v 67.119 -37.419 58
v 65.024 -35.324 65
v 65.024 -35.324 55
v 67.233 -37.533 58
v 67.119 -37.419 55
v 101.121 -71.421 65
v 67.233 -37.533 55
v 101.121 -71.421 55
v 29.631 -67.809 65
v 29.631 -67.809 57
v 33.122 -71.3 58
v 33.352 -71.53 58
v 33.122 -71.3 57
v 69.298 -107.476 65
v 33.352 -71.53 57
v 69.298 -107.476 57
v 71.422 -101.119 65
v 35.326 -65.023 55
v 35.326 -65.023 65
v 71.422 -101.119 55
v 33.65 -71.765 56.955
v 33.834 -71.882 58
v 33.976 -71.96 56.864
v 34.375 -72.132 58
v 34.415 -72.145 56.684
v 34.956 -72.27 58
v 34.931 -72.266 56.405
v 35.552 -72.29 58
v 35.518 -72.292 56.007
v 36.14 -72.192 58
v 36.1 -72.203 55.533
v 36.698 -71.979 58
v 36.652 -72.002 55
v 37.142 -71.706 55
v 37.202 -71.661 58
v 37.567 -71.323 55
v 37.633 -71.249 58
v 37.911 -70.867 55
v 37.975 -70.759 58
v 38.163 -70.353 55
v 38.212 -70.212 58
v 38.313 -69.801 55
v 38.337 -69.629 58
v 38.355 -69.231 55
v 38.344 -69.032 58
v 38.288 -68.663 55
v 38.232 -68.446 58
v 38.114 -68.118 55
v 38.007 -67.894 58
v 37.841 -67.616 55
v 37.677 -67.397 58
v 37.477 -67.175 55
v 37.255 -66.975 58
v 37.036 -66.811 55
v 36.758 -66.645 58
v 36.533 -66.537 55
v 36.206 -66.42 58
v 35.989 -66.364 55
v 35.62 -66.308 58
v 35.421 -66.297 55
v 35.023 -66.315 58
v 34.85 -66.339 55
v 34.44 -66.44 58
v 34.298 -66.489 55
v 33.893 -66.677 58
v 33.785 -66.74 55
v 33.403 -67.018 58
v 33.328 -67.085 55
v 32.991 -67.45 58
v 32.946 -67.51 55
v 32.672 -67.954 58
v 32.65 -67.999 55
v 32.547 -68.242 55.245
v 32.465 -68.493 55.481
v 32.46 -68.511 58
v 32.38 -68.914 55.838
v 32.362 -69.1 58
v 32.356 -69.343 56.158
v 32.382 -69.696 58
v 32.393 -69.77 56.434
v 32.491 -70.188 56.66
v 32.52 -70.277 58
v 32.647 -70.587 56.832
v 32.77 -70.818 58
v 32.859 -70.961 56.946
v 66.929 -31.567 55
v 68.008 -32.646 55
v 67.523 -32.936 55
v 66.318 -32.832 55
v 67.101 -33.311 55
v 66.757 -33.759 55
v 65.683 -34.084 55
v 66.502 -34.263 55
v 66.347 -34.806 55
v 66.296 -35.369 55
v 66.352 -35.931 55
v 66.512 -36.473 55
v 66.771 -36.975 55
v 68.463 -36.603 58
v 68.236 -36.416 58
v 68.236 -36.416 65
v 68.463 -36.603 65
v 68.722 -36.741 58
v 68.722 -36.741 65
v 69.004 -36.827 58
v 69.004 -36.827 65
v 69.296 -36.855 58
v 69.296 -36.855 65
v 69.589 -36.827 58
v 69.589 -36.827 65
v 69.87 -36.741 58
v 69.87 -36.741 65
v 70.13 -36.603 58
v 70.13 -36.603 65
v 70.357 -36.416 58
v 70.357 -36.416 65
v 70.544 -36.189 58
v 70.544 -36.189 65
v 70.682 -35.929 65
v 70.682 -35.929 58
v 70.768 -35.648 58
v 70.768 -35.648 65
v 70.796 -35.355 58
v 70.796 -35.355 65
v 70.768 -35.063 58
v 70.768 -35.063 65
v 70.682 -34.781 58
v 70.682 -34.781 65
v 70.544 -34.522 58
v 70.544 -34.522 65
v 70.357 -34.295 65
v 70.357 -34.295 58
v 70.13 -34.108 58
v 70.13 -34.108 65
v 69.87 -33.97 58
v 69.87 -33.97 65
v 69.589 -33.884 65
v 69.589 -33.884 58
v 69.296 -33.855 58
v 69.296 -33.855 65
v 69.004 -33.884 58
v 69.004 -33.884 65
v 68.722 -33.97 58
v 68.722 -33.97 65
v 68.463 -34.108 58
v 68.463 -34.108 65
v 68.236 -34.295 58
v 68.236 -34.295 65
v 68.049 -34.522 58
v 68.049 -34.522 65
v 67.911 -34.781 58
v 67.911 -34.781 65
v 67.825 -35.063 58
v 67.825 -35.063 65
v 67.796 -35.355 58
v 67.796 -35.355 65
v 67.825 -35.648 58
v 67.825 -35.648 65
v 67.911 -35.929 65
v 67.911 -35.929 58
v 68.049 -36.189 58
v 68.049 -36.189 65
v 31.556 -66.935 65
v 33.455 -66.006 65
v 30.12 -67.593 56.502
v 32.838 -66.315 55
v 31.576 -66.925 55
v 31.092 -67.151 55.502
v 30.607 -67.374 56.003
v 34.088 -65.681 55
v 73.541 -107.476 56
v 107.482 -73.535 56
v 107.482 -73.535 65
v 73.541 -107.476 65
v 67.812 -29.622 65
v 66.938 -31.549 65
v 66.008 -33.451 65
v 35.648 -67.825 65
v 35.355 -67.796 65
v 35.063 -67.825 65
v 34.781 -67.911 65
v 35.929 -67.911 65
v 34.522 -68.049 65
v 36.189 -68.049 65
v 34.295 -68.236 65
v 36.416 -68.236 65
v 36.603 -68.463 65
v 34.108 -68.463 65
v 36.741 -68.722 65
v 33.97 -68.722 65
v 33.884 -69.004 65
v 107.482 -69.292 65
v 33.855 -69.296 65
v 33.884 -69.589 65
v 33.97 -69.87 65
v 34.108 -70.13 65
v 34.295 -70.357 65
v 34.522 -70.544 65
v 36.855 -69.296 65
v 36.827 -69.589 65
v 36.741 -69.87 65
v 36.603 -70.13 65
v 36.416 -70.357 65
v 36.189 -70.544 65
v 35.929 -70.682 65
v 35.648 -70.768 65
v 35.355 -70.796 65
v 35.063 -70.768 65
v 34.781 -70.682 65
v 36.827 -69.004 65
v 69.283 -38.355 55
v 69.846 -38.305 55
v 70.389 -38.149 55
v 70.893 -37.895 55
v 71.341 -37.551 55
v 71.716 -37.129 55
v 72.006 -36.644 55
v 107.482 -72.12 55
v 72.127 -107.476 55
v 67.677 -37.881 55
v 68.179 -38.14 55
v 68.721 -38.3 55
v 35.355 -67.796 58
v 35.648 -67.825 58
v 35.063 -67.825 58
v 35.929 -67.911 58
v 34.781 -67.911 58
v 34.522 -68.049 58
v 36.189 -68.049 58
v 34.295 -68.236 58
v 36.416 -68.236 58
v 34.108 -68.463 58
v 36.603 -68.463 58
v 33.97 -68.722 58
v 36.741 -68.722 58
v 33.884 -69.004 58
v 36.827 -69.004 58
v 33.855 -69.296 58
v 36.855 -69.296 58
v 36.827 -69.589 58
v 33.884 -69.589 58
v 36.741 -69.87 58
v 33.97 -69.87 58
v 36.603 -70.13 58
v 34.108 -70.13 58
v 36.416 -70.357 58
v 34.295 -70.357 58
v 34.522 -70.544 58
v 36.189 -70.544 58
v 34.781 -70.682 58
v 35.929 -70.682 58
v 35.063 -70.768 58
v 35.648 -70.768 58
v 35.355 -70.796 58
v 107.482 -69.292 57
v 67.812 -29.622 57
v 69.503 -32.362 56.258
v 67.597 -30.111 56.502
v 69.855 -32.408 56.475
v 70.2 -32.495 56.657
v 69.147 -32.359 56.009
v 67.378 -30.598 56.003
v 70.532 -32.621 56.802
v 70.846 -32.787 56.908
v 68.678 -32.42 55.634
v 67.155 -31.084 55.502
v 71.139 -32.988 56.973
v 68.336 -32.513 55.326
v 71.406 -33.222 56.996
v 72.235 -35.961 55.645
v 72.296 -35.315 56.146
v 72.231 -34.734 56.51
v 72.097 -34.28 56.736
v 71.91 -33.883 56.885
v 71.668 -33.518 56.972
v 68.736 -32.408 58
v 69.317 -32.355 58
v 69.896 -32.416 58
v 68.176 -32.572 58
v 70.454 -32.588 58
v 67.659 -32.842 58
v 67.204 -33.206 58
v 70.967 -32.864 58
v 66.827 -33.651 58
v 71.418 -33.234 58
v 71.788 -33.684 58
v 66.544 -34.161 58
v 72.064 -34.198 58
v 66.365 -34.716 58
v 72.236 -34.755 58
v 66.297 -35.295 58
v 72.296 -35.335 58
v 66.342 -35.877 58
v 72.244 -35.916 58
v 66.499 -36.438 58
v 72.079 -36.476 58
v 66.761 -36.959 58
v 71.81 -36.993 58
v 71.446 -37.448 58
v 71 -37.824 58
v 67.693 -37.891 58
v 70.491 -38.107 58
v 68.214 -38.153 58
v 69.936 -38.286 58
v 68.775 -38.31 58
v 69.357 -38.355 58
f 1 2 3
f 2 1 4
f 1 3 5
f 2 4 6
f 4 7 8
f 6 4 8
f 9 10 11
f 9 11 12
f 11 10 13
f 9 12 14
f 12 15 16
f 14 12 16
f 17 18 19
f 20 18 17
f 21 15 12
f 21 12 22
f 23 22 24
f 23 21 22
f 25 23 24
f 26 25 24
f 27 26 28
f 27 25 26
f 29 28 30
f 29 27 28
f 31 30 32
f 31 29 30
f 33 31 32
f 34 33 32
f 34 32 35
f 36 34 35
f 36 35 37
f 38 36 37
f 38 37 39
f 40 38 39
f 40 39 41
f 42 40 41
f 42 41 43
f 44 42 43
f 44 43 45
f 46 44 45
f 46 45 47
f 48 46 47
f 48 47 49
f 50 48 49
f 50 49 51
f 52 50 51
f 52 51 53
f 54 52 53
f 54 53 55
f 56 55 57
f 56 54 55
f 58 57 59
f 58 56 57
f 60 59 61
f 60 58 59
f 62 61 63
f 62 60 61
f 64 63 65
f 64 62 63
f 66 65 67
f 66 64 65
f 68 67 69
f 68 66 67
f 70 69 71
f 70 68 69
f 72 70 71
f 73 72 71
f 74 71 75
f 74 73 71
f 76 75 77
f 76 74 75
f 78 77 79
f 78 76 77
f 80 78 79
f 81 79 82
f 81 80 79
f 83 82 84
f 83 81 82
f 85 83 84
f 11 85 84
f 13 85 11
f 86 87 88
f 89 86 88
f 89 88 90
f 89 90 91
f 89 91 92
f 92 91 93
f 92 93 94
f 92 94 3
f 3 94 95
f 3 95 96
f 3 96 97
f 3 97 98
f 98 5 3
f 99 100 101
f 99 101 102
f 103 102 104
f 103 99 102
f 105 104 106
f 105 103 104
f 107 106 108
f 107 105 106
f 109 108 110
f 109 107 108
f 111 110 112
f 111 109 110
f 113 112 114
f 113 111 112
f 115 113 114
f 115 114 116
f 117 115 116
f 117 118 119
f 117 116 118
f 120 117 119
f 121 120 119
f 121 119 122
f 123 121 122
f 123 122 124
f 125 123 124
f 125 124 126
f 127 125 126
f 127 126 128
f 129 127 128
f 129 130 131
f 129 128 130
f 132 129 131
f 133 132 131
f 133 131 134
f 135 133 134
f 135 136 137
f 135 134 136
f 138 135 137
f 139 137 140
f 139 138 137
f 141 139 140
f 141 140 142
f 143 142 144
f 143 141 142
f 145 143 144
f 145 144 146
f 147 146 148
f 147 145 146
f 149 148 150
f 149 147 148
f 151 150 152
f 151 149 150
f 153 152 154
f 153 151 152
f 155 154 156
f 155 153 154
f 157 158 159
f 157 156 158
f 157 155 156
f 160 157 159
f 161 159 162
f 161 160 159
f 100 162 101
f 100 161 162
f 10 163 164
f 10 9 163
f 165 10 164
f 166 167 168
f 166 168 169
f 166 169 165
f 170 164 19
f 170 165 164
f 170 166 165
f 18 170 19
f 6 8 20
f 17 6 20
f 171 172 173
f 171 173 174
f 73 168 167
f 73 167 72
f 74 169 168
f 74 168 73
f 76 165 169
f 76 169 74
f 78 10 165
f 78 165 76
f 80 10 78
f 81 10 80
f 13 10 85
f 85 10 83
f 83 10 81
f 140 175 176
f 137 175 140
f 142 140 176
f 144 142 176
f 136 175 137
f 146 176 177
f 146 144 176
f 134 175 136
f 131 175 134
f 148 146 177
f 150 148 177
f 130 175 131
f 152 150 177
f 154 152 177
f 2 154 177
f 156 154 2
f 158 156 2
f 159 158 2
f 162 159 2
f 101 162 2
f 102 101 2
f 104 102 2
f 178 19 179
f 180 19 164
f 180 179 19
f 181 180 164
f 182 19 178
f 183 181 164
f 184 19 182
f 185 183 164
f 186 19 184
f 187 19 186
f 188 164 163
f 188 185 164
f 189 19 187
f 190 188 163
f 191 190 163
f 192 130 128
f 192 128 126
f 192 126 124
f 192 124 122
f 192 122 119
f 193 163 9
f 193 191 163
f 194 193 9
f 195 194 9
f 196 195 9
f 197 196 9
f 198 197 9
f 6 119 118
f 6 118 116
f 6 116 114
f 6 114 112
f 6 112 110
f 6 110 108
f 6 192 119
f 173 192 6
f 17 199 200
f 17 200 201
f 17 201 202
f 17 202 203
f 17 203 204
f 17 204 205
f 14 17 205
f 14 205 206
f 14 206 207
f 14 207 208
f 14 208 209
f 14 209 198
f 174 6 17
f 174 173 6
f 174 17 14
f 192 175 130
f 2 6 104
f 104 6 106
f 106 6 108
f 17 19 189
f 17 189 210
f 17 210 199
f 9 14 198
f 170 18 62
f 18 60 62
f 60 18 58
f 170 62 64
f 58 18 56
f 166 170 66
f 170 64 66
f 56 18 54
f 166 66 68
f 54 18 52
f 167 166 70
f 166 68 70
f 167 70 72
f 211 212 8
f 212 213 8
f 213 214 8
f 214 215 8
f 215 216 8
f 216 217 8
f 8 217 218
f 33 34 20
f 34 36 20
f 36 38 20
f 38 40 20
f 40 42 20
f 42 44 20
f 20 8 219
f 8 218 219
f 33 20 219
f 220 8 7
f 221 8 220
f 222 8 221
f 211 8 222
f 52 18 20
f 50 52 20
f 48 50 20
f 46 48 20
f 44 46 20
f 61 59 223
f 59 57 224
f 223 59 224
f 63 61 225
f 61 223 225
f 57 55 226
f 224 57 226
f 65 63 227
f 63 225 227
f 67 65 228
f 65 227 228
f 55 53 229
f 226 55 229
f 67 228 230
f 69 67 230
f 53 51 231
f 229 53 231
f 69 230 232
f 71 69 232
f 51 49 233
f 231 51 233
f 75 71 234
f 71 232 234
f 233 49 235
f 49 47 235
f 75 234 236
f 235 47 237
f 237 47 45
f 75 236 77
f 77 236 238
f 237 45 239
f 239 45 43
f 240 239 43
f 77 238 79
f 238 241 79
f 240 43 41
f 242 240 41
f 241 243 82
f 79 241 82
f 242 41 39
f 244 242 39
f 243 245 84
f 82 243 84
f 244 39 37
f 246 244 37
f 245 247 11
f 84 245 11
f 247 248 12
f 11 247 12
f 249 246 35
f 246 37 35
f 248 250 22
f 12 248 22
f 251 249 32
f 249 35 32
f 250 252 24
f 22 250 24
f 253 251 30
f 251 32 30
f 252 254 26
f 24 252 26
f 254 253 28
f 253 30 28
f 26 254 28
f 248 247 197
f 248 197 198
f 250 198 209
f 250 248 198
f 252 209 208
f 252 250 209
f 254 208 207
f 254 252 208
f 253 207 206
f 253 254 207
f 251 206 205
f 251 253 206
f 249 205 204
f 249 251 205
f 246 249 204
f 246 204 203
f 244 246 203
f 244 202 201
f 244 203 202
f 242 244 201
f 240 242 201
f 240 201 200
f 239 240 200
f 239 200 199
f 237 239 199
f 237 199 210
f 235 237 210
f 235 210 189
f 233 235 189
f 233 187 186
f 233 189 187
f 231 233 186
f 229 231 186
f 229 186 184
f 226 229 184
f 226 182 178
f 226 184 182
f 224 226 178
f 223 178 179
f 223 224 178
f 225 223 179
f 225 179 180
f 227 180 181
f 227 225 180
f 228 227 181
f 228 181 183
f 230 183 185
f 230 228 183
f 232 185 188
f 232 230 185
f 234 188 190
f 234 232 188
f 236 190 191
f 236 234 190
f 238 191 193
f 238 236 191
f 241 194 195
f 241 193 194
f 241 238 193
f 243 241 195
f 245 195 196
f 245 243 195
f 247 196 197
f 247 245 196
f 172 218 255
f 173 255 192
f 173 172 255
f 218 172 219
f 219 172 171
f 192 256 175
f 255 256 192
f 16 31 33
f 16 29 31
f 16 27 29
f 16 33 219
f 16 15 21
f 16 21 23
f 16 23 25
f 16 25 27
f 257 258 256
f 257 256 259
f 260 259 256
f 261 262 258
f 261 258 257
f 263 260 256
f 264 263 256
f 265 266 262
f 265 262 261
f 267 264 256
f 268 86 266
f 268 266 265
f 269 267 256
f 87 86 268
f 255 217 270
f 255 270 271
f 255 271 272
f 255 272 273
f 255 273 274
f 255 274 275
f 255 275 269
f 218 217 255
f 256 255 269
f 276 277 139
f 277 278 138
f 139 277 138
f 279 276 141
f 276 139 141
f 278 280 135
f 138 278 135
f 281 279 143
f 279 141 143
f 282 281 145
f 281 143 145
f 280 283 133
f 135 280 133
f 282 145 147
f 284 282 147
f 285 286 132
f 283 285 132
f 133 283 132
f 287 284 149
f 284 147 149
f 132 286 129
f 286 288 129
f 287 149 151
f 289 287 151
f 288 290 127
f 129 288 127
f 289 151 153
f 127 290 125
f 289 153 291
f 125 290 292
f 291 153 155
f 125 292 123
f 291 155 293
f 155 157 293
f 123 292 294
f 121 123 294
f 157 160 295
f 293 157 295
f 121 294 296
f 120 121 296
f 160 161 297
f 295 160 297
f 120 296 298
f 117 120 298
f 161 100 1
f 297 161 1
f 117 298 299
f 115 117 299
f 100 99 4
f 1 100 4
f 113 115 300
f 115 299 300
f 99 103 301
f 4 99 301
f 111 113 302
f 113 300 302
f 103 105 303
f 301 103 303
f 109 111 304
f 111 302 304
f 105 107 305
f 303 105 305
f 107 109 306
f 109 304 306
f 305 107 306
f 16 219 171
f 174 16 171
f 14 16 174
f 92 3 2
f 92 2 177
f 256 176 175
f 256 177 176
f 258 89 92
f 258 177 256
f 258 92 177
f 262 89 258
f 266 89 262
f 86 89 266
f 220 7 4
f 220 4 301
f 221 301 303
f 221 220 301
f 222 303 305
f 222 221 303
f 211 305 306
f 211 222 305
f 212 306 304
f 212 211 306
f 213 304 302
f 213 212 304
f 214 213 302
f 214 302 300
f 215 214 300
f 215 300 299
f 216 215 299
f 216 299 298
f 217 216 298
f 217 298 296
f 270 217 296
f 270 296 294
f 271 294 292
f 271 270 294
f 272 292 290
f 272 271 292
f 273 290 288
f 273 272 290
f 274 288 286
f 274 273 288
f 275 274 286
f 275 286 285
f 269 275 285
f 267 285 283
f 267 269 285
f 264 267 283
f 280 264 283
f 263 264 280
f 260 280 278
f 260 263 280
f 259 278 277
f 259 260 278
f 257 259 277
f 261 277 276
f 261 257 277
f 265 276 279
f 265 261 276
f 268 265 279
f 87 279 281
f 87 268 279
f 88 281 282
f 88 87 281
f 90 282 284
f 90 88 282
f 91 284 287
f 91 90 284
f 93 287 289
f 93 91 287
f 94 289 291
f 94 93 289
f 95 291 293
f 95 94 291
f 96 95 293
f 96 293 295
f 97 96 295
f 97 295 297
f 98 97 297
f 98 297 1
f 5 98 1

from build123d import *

# Parameters (mm, degrees)
CYLINDER1977_R               = 3
CYLINDER1977_DEPTH           = 3
CYLINDER1974_R               = 3
CYLINDER1974_DEPTH           = 3
CYLINDER1975_R               = 3
CYLINDER1975_DEPTH           = 3
CYLINDER1976_R               = 3
CYLINDER1976_DEPTH           = 3
COMPOUND1064_PLACEMENT_ANGLE = 225
CYLINDER1981_R               = 1.5
CYLINDER1981_DEPTH           = 60
CYLINDER1978_R               = 1.5
CYLINDER1978_DEPTH           = 60
CYLINDER1979_R               = 1.5
CYLINDER1979_DEPTH           = 60
CYLINDER1980_R               = 1.5
CYLINDER1980_DEPTH           = 60
COMPOUND1067_PLACEMENT_ANGLE = 225
CYLINDER1982_R               = 74
CYLINDER1982_DEPTH           = 40
BOX982_W                     = 42
BOX982_H                     = 62
BOX982_DEPTH                 = 50
COMPOUND1065_PLACEMENT_ANGLE = 225
BOX983_W                     = 54
BOX983_H                     = 68
BOX983_DEPTH                 = 10
COMPOUND1066_PLACEMENT_ANGLE = 225
CHAMFER073_SIZE              = 3
CHAMFER074_SIZE              = 2
CHAMFER075_SIZE              = 1


with BuildPart() as v_lec1977:
    # Cylinder1977 → Cylinder1977 (new body)
    with BuildSketch(Plane(origin=(-24, 74, -80), x_dir=(1, 0, 0), z_dir=(0, 0, 1))):
        Circle(CYLINDER1977_R)
    extrude(amount=CYLINDER1977_DEPTH)


with BuildPart() as v_lec1974:
    # Cylinder1974 → Cylinder1974 (new body)
    with BuildSketch(Plane(origin=(-15, 135, -80), x_dir=(1, 0, 0), z_dir=(0, 0, 1))):
        Circle(CYLINDER1974_R)
    extrude(amount=CYLINDER1974_DEPTH)


with BuildPart() as v_lec1975:
    # Cylinder1975 → Cylinder1975 (new body)
    with BuildSketch(Plane(origin=(15, 135, -80), x_dir=(1, 0, 0), z_dir=(0, 0, 1))):
        Circle(CYLINDER1975_R)
    extrude(amount=CYLINDER1975_DEPTH)


with BuildPart() as compound1064:
    # Cylinder1976 → Cylinder1976 (new body)
    with BuildSketch(Plane(origin=(24, 74, -80), x_dir=(1, 0, 0), z_dir=(0, 0, 1))):
        Circle(CYLINDER1976_R)
    extrude(amount=CYLINDER1976_DEPTH)

    # Compound1064: union Válec1977, Válec1974, Válec1975
    add(v_lec1977.part)
    add(v_lec1974.part)
    add(v_lec1975.part)


with BuildPart() as compound1064_1:
    # Compound1064 placement: moved
    add(compound1064.part.moved(Location((0, 0, 135))).rotate(Axis((0, 0, 135), (0, 0, 1)), COMPOUND1064_PLACEMENT_ANGLE))


with BuildPart() as v_lec1981:
    # Cylinder1981 → Cylinder1981 (new body)
    with BuildSketch(Plane(origin=(-24, 74, -80), x_dir=(1, 0, 0), z_dir=(0, 0, 1))):
        Circle(CYLINDER1981_R)
    extrude(amount=CYLINDER1981_DEPTH)


with BuildPart() as v_lec1978:
    # Cylinder1978 → Cylinder1978 (new body)
    with BuildSketch(Plane(origin=(-15, 135, -80), x_dir=(1, 0, 0), z_dir=(0, 0, 1))):
        Circle(CYLINDER1978_R)
    extrude(amount=CYLINDER1978_DEPTH)


with BuildPart() as v_lec1979:
    # Cylinder1979 → Cylinder1979 (new body)
    with BuildSketch(Plane(origin=(15, 135, -80), x_dir=(1, 0, 0), z_dir=(0, 0, 1))):
        Circle(CYLINDER1979_R)
    extrude(amount=CYLINDER1979_DEPTH)


with BuildPart() as compound1067:
    # Cylinder1980 → Cylinder1980 (new body)
    with BuildSketch(Plane(origin=(24, 74, -80), x_dir=(1, 0, 0), z_dir=(0, 0, 1))):
        Circle(CYLINDER1980_R)
    extrude(amount=CYLINDER1980_DEPTH)

    # Compound1067: union Válec1981, Válec1978, Válec1979
    add(v_lec1981.part)
    add(v_lec1978.part)
    add(v_lec1979.part)


with BuildPart() as compound1067_1:
    # Compound1067 placement: moved
    add(compound1067.part.moved(Location((0, 0, 100))).rotate(Axis((0, 0, 100), (0, 0, 1)), COMPOUND1067_PLACEMENT_ANGLE))


with BuildPart() as v_lec1982:
    # Cylinder1982 → Cylinder1982 (new body)
    with BuildSketch(Plane.XY.offset(44)):
        Circle(CYLINDER1982_R)
    extrude(amount=CYLINDER1982_DEPTH)


with BuildPart() as compound1065:
    # Box982 → Box982 (new body)
    with BuildSketch(Plane(origin=(-21.001071, 60.005081, 31), x_dir=(1, 0, 0), z_dir=(0, 0, 1))):
        with Locations((21, 31)):
            Rectangle(BOX982_W, BOX982_H)
    extrude(amount=BOX982_DEPTH)


with BuildPart() as compound1065_1:
    # Compound1065 placement: moved
    add(compound1065.part.rotate(Axis((0, 0, 0), (0, 0, 1)), COMPOUND1065_PLACEMENT_ANGLE))


with BuildPart() as cut664:
    # Box983 → Box983 (new body)
    with BuildSketch(Plane(origin=(-27.004408, 59.99801, 75), x_dir=(1, 0, 0), z_dir=(0, 0, 1))):
        with Locations((27, 34)):
            Rectangle(BOX983_W, BOX983_H)
    extrude(amount=BOX983_DEPTH)


with BuildPart() as cut664_1:
    # Compound1066 placement: moved
    add(cut664.part.moved(Location((0, 0, -20))).rotate(Axis((0, 0, -20), (0, 0, 1)), COMPOUND1066_PLACEMENT_ANGLE))

    # Cut666: cut Compound1065
    add(compound1065_1.part, mode=Mode.SUBTRACT)

    # Cut669: cut Válec1982
    add(v_lec1982.part, mode=Mode.SUBTRACT)

    # Chamfer073
    chamfer073_edges = [cut664_1.edges().sort_by_distance(p)[0] for p in [
        (109.603261, -71.413261, 60),
        (71.419495, -109.597027, 60),
    ]]
    chamfer(chamfer073_edges, length=CHAMFER073_SIZE)

    # Chamfer074
    chamfer074_edges = [cut664_1.edges().sort_by_distance(p)[0] for p in [
        (87.647149, -49.457149, 55),
        (49.464605, -87.642137, 55),
    ]]
    chamfer(chamfer074_edges, length=CHAMFER074_SIZE)

    # Chamfer075
    chamfer075_edges = [cut664_1.edges().sort_by_distance(p)[0] for p in [
        (90.511378, -90.505144, 55),
    ]]
    chamfer(chamfer075_edges, length=CHAMFER075_SIZE)

    # Cut665: cut Compound1067
    add(compound1067_1.part, mode=Mode.SUBTRACT)

    # Cut664: cut Compound1064
    add(compound1064_1.part, mode=Mode.SUBTRACT)


solid = cut664_1.part
